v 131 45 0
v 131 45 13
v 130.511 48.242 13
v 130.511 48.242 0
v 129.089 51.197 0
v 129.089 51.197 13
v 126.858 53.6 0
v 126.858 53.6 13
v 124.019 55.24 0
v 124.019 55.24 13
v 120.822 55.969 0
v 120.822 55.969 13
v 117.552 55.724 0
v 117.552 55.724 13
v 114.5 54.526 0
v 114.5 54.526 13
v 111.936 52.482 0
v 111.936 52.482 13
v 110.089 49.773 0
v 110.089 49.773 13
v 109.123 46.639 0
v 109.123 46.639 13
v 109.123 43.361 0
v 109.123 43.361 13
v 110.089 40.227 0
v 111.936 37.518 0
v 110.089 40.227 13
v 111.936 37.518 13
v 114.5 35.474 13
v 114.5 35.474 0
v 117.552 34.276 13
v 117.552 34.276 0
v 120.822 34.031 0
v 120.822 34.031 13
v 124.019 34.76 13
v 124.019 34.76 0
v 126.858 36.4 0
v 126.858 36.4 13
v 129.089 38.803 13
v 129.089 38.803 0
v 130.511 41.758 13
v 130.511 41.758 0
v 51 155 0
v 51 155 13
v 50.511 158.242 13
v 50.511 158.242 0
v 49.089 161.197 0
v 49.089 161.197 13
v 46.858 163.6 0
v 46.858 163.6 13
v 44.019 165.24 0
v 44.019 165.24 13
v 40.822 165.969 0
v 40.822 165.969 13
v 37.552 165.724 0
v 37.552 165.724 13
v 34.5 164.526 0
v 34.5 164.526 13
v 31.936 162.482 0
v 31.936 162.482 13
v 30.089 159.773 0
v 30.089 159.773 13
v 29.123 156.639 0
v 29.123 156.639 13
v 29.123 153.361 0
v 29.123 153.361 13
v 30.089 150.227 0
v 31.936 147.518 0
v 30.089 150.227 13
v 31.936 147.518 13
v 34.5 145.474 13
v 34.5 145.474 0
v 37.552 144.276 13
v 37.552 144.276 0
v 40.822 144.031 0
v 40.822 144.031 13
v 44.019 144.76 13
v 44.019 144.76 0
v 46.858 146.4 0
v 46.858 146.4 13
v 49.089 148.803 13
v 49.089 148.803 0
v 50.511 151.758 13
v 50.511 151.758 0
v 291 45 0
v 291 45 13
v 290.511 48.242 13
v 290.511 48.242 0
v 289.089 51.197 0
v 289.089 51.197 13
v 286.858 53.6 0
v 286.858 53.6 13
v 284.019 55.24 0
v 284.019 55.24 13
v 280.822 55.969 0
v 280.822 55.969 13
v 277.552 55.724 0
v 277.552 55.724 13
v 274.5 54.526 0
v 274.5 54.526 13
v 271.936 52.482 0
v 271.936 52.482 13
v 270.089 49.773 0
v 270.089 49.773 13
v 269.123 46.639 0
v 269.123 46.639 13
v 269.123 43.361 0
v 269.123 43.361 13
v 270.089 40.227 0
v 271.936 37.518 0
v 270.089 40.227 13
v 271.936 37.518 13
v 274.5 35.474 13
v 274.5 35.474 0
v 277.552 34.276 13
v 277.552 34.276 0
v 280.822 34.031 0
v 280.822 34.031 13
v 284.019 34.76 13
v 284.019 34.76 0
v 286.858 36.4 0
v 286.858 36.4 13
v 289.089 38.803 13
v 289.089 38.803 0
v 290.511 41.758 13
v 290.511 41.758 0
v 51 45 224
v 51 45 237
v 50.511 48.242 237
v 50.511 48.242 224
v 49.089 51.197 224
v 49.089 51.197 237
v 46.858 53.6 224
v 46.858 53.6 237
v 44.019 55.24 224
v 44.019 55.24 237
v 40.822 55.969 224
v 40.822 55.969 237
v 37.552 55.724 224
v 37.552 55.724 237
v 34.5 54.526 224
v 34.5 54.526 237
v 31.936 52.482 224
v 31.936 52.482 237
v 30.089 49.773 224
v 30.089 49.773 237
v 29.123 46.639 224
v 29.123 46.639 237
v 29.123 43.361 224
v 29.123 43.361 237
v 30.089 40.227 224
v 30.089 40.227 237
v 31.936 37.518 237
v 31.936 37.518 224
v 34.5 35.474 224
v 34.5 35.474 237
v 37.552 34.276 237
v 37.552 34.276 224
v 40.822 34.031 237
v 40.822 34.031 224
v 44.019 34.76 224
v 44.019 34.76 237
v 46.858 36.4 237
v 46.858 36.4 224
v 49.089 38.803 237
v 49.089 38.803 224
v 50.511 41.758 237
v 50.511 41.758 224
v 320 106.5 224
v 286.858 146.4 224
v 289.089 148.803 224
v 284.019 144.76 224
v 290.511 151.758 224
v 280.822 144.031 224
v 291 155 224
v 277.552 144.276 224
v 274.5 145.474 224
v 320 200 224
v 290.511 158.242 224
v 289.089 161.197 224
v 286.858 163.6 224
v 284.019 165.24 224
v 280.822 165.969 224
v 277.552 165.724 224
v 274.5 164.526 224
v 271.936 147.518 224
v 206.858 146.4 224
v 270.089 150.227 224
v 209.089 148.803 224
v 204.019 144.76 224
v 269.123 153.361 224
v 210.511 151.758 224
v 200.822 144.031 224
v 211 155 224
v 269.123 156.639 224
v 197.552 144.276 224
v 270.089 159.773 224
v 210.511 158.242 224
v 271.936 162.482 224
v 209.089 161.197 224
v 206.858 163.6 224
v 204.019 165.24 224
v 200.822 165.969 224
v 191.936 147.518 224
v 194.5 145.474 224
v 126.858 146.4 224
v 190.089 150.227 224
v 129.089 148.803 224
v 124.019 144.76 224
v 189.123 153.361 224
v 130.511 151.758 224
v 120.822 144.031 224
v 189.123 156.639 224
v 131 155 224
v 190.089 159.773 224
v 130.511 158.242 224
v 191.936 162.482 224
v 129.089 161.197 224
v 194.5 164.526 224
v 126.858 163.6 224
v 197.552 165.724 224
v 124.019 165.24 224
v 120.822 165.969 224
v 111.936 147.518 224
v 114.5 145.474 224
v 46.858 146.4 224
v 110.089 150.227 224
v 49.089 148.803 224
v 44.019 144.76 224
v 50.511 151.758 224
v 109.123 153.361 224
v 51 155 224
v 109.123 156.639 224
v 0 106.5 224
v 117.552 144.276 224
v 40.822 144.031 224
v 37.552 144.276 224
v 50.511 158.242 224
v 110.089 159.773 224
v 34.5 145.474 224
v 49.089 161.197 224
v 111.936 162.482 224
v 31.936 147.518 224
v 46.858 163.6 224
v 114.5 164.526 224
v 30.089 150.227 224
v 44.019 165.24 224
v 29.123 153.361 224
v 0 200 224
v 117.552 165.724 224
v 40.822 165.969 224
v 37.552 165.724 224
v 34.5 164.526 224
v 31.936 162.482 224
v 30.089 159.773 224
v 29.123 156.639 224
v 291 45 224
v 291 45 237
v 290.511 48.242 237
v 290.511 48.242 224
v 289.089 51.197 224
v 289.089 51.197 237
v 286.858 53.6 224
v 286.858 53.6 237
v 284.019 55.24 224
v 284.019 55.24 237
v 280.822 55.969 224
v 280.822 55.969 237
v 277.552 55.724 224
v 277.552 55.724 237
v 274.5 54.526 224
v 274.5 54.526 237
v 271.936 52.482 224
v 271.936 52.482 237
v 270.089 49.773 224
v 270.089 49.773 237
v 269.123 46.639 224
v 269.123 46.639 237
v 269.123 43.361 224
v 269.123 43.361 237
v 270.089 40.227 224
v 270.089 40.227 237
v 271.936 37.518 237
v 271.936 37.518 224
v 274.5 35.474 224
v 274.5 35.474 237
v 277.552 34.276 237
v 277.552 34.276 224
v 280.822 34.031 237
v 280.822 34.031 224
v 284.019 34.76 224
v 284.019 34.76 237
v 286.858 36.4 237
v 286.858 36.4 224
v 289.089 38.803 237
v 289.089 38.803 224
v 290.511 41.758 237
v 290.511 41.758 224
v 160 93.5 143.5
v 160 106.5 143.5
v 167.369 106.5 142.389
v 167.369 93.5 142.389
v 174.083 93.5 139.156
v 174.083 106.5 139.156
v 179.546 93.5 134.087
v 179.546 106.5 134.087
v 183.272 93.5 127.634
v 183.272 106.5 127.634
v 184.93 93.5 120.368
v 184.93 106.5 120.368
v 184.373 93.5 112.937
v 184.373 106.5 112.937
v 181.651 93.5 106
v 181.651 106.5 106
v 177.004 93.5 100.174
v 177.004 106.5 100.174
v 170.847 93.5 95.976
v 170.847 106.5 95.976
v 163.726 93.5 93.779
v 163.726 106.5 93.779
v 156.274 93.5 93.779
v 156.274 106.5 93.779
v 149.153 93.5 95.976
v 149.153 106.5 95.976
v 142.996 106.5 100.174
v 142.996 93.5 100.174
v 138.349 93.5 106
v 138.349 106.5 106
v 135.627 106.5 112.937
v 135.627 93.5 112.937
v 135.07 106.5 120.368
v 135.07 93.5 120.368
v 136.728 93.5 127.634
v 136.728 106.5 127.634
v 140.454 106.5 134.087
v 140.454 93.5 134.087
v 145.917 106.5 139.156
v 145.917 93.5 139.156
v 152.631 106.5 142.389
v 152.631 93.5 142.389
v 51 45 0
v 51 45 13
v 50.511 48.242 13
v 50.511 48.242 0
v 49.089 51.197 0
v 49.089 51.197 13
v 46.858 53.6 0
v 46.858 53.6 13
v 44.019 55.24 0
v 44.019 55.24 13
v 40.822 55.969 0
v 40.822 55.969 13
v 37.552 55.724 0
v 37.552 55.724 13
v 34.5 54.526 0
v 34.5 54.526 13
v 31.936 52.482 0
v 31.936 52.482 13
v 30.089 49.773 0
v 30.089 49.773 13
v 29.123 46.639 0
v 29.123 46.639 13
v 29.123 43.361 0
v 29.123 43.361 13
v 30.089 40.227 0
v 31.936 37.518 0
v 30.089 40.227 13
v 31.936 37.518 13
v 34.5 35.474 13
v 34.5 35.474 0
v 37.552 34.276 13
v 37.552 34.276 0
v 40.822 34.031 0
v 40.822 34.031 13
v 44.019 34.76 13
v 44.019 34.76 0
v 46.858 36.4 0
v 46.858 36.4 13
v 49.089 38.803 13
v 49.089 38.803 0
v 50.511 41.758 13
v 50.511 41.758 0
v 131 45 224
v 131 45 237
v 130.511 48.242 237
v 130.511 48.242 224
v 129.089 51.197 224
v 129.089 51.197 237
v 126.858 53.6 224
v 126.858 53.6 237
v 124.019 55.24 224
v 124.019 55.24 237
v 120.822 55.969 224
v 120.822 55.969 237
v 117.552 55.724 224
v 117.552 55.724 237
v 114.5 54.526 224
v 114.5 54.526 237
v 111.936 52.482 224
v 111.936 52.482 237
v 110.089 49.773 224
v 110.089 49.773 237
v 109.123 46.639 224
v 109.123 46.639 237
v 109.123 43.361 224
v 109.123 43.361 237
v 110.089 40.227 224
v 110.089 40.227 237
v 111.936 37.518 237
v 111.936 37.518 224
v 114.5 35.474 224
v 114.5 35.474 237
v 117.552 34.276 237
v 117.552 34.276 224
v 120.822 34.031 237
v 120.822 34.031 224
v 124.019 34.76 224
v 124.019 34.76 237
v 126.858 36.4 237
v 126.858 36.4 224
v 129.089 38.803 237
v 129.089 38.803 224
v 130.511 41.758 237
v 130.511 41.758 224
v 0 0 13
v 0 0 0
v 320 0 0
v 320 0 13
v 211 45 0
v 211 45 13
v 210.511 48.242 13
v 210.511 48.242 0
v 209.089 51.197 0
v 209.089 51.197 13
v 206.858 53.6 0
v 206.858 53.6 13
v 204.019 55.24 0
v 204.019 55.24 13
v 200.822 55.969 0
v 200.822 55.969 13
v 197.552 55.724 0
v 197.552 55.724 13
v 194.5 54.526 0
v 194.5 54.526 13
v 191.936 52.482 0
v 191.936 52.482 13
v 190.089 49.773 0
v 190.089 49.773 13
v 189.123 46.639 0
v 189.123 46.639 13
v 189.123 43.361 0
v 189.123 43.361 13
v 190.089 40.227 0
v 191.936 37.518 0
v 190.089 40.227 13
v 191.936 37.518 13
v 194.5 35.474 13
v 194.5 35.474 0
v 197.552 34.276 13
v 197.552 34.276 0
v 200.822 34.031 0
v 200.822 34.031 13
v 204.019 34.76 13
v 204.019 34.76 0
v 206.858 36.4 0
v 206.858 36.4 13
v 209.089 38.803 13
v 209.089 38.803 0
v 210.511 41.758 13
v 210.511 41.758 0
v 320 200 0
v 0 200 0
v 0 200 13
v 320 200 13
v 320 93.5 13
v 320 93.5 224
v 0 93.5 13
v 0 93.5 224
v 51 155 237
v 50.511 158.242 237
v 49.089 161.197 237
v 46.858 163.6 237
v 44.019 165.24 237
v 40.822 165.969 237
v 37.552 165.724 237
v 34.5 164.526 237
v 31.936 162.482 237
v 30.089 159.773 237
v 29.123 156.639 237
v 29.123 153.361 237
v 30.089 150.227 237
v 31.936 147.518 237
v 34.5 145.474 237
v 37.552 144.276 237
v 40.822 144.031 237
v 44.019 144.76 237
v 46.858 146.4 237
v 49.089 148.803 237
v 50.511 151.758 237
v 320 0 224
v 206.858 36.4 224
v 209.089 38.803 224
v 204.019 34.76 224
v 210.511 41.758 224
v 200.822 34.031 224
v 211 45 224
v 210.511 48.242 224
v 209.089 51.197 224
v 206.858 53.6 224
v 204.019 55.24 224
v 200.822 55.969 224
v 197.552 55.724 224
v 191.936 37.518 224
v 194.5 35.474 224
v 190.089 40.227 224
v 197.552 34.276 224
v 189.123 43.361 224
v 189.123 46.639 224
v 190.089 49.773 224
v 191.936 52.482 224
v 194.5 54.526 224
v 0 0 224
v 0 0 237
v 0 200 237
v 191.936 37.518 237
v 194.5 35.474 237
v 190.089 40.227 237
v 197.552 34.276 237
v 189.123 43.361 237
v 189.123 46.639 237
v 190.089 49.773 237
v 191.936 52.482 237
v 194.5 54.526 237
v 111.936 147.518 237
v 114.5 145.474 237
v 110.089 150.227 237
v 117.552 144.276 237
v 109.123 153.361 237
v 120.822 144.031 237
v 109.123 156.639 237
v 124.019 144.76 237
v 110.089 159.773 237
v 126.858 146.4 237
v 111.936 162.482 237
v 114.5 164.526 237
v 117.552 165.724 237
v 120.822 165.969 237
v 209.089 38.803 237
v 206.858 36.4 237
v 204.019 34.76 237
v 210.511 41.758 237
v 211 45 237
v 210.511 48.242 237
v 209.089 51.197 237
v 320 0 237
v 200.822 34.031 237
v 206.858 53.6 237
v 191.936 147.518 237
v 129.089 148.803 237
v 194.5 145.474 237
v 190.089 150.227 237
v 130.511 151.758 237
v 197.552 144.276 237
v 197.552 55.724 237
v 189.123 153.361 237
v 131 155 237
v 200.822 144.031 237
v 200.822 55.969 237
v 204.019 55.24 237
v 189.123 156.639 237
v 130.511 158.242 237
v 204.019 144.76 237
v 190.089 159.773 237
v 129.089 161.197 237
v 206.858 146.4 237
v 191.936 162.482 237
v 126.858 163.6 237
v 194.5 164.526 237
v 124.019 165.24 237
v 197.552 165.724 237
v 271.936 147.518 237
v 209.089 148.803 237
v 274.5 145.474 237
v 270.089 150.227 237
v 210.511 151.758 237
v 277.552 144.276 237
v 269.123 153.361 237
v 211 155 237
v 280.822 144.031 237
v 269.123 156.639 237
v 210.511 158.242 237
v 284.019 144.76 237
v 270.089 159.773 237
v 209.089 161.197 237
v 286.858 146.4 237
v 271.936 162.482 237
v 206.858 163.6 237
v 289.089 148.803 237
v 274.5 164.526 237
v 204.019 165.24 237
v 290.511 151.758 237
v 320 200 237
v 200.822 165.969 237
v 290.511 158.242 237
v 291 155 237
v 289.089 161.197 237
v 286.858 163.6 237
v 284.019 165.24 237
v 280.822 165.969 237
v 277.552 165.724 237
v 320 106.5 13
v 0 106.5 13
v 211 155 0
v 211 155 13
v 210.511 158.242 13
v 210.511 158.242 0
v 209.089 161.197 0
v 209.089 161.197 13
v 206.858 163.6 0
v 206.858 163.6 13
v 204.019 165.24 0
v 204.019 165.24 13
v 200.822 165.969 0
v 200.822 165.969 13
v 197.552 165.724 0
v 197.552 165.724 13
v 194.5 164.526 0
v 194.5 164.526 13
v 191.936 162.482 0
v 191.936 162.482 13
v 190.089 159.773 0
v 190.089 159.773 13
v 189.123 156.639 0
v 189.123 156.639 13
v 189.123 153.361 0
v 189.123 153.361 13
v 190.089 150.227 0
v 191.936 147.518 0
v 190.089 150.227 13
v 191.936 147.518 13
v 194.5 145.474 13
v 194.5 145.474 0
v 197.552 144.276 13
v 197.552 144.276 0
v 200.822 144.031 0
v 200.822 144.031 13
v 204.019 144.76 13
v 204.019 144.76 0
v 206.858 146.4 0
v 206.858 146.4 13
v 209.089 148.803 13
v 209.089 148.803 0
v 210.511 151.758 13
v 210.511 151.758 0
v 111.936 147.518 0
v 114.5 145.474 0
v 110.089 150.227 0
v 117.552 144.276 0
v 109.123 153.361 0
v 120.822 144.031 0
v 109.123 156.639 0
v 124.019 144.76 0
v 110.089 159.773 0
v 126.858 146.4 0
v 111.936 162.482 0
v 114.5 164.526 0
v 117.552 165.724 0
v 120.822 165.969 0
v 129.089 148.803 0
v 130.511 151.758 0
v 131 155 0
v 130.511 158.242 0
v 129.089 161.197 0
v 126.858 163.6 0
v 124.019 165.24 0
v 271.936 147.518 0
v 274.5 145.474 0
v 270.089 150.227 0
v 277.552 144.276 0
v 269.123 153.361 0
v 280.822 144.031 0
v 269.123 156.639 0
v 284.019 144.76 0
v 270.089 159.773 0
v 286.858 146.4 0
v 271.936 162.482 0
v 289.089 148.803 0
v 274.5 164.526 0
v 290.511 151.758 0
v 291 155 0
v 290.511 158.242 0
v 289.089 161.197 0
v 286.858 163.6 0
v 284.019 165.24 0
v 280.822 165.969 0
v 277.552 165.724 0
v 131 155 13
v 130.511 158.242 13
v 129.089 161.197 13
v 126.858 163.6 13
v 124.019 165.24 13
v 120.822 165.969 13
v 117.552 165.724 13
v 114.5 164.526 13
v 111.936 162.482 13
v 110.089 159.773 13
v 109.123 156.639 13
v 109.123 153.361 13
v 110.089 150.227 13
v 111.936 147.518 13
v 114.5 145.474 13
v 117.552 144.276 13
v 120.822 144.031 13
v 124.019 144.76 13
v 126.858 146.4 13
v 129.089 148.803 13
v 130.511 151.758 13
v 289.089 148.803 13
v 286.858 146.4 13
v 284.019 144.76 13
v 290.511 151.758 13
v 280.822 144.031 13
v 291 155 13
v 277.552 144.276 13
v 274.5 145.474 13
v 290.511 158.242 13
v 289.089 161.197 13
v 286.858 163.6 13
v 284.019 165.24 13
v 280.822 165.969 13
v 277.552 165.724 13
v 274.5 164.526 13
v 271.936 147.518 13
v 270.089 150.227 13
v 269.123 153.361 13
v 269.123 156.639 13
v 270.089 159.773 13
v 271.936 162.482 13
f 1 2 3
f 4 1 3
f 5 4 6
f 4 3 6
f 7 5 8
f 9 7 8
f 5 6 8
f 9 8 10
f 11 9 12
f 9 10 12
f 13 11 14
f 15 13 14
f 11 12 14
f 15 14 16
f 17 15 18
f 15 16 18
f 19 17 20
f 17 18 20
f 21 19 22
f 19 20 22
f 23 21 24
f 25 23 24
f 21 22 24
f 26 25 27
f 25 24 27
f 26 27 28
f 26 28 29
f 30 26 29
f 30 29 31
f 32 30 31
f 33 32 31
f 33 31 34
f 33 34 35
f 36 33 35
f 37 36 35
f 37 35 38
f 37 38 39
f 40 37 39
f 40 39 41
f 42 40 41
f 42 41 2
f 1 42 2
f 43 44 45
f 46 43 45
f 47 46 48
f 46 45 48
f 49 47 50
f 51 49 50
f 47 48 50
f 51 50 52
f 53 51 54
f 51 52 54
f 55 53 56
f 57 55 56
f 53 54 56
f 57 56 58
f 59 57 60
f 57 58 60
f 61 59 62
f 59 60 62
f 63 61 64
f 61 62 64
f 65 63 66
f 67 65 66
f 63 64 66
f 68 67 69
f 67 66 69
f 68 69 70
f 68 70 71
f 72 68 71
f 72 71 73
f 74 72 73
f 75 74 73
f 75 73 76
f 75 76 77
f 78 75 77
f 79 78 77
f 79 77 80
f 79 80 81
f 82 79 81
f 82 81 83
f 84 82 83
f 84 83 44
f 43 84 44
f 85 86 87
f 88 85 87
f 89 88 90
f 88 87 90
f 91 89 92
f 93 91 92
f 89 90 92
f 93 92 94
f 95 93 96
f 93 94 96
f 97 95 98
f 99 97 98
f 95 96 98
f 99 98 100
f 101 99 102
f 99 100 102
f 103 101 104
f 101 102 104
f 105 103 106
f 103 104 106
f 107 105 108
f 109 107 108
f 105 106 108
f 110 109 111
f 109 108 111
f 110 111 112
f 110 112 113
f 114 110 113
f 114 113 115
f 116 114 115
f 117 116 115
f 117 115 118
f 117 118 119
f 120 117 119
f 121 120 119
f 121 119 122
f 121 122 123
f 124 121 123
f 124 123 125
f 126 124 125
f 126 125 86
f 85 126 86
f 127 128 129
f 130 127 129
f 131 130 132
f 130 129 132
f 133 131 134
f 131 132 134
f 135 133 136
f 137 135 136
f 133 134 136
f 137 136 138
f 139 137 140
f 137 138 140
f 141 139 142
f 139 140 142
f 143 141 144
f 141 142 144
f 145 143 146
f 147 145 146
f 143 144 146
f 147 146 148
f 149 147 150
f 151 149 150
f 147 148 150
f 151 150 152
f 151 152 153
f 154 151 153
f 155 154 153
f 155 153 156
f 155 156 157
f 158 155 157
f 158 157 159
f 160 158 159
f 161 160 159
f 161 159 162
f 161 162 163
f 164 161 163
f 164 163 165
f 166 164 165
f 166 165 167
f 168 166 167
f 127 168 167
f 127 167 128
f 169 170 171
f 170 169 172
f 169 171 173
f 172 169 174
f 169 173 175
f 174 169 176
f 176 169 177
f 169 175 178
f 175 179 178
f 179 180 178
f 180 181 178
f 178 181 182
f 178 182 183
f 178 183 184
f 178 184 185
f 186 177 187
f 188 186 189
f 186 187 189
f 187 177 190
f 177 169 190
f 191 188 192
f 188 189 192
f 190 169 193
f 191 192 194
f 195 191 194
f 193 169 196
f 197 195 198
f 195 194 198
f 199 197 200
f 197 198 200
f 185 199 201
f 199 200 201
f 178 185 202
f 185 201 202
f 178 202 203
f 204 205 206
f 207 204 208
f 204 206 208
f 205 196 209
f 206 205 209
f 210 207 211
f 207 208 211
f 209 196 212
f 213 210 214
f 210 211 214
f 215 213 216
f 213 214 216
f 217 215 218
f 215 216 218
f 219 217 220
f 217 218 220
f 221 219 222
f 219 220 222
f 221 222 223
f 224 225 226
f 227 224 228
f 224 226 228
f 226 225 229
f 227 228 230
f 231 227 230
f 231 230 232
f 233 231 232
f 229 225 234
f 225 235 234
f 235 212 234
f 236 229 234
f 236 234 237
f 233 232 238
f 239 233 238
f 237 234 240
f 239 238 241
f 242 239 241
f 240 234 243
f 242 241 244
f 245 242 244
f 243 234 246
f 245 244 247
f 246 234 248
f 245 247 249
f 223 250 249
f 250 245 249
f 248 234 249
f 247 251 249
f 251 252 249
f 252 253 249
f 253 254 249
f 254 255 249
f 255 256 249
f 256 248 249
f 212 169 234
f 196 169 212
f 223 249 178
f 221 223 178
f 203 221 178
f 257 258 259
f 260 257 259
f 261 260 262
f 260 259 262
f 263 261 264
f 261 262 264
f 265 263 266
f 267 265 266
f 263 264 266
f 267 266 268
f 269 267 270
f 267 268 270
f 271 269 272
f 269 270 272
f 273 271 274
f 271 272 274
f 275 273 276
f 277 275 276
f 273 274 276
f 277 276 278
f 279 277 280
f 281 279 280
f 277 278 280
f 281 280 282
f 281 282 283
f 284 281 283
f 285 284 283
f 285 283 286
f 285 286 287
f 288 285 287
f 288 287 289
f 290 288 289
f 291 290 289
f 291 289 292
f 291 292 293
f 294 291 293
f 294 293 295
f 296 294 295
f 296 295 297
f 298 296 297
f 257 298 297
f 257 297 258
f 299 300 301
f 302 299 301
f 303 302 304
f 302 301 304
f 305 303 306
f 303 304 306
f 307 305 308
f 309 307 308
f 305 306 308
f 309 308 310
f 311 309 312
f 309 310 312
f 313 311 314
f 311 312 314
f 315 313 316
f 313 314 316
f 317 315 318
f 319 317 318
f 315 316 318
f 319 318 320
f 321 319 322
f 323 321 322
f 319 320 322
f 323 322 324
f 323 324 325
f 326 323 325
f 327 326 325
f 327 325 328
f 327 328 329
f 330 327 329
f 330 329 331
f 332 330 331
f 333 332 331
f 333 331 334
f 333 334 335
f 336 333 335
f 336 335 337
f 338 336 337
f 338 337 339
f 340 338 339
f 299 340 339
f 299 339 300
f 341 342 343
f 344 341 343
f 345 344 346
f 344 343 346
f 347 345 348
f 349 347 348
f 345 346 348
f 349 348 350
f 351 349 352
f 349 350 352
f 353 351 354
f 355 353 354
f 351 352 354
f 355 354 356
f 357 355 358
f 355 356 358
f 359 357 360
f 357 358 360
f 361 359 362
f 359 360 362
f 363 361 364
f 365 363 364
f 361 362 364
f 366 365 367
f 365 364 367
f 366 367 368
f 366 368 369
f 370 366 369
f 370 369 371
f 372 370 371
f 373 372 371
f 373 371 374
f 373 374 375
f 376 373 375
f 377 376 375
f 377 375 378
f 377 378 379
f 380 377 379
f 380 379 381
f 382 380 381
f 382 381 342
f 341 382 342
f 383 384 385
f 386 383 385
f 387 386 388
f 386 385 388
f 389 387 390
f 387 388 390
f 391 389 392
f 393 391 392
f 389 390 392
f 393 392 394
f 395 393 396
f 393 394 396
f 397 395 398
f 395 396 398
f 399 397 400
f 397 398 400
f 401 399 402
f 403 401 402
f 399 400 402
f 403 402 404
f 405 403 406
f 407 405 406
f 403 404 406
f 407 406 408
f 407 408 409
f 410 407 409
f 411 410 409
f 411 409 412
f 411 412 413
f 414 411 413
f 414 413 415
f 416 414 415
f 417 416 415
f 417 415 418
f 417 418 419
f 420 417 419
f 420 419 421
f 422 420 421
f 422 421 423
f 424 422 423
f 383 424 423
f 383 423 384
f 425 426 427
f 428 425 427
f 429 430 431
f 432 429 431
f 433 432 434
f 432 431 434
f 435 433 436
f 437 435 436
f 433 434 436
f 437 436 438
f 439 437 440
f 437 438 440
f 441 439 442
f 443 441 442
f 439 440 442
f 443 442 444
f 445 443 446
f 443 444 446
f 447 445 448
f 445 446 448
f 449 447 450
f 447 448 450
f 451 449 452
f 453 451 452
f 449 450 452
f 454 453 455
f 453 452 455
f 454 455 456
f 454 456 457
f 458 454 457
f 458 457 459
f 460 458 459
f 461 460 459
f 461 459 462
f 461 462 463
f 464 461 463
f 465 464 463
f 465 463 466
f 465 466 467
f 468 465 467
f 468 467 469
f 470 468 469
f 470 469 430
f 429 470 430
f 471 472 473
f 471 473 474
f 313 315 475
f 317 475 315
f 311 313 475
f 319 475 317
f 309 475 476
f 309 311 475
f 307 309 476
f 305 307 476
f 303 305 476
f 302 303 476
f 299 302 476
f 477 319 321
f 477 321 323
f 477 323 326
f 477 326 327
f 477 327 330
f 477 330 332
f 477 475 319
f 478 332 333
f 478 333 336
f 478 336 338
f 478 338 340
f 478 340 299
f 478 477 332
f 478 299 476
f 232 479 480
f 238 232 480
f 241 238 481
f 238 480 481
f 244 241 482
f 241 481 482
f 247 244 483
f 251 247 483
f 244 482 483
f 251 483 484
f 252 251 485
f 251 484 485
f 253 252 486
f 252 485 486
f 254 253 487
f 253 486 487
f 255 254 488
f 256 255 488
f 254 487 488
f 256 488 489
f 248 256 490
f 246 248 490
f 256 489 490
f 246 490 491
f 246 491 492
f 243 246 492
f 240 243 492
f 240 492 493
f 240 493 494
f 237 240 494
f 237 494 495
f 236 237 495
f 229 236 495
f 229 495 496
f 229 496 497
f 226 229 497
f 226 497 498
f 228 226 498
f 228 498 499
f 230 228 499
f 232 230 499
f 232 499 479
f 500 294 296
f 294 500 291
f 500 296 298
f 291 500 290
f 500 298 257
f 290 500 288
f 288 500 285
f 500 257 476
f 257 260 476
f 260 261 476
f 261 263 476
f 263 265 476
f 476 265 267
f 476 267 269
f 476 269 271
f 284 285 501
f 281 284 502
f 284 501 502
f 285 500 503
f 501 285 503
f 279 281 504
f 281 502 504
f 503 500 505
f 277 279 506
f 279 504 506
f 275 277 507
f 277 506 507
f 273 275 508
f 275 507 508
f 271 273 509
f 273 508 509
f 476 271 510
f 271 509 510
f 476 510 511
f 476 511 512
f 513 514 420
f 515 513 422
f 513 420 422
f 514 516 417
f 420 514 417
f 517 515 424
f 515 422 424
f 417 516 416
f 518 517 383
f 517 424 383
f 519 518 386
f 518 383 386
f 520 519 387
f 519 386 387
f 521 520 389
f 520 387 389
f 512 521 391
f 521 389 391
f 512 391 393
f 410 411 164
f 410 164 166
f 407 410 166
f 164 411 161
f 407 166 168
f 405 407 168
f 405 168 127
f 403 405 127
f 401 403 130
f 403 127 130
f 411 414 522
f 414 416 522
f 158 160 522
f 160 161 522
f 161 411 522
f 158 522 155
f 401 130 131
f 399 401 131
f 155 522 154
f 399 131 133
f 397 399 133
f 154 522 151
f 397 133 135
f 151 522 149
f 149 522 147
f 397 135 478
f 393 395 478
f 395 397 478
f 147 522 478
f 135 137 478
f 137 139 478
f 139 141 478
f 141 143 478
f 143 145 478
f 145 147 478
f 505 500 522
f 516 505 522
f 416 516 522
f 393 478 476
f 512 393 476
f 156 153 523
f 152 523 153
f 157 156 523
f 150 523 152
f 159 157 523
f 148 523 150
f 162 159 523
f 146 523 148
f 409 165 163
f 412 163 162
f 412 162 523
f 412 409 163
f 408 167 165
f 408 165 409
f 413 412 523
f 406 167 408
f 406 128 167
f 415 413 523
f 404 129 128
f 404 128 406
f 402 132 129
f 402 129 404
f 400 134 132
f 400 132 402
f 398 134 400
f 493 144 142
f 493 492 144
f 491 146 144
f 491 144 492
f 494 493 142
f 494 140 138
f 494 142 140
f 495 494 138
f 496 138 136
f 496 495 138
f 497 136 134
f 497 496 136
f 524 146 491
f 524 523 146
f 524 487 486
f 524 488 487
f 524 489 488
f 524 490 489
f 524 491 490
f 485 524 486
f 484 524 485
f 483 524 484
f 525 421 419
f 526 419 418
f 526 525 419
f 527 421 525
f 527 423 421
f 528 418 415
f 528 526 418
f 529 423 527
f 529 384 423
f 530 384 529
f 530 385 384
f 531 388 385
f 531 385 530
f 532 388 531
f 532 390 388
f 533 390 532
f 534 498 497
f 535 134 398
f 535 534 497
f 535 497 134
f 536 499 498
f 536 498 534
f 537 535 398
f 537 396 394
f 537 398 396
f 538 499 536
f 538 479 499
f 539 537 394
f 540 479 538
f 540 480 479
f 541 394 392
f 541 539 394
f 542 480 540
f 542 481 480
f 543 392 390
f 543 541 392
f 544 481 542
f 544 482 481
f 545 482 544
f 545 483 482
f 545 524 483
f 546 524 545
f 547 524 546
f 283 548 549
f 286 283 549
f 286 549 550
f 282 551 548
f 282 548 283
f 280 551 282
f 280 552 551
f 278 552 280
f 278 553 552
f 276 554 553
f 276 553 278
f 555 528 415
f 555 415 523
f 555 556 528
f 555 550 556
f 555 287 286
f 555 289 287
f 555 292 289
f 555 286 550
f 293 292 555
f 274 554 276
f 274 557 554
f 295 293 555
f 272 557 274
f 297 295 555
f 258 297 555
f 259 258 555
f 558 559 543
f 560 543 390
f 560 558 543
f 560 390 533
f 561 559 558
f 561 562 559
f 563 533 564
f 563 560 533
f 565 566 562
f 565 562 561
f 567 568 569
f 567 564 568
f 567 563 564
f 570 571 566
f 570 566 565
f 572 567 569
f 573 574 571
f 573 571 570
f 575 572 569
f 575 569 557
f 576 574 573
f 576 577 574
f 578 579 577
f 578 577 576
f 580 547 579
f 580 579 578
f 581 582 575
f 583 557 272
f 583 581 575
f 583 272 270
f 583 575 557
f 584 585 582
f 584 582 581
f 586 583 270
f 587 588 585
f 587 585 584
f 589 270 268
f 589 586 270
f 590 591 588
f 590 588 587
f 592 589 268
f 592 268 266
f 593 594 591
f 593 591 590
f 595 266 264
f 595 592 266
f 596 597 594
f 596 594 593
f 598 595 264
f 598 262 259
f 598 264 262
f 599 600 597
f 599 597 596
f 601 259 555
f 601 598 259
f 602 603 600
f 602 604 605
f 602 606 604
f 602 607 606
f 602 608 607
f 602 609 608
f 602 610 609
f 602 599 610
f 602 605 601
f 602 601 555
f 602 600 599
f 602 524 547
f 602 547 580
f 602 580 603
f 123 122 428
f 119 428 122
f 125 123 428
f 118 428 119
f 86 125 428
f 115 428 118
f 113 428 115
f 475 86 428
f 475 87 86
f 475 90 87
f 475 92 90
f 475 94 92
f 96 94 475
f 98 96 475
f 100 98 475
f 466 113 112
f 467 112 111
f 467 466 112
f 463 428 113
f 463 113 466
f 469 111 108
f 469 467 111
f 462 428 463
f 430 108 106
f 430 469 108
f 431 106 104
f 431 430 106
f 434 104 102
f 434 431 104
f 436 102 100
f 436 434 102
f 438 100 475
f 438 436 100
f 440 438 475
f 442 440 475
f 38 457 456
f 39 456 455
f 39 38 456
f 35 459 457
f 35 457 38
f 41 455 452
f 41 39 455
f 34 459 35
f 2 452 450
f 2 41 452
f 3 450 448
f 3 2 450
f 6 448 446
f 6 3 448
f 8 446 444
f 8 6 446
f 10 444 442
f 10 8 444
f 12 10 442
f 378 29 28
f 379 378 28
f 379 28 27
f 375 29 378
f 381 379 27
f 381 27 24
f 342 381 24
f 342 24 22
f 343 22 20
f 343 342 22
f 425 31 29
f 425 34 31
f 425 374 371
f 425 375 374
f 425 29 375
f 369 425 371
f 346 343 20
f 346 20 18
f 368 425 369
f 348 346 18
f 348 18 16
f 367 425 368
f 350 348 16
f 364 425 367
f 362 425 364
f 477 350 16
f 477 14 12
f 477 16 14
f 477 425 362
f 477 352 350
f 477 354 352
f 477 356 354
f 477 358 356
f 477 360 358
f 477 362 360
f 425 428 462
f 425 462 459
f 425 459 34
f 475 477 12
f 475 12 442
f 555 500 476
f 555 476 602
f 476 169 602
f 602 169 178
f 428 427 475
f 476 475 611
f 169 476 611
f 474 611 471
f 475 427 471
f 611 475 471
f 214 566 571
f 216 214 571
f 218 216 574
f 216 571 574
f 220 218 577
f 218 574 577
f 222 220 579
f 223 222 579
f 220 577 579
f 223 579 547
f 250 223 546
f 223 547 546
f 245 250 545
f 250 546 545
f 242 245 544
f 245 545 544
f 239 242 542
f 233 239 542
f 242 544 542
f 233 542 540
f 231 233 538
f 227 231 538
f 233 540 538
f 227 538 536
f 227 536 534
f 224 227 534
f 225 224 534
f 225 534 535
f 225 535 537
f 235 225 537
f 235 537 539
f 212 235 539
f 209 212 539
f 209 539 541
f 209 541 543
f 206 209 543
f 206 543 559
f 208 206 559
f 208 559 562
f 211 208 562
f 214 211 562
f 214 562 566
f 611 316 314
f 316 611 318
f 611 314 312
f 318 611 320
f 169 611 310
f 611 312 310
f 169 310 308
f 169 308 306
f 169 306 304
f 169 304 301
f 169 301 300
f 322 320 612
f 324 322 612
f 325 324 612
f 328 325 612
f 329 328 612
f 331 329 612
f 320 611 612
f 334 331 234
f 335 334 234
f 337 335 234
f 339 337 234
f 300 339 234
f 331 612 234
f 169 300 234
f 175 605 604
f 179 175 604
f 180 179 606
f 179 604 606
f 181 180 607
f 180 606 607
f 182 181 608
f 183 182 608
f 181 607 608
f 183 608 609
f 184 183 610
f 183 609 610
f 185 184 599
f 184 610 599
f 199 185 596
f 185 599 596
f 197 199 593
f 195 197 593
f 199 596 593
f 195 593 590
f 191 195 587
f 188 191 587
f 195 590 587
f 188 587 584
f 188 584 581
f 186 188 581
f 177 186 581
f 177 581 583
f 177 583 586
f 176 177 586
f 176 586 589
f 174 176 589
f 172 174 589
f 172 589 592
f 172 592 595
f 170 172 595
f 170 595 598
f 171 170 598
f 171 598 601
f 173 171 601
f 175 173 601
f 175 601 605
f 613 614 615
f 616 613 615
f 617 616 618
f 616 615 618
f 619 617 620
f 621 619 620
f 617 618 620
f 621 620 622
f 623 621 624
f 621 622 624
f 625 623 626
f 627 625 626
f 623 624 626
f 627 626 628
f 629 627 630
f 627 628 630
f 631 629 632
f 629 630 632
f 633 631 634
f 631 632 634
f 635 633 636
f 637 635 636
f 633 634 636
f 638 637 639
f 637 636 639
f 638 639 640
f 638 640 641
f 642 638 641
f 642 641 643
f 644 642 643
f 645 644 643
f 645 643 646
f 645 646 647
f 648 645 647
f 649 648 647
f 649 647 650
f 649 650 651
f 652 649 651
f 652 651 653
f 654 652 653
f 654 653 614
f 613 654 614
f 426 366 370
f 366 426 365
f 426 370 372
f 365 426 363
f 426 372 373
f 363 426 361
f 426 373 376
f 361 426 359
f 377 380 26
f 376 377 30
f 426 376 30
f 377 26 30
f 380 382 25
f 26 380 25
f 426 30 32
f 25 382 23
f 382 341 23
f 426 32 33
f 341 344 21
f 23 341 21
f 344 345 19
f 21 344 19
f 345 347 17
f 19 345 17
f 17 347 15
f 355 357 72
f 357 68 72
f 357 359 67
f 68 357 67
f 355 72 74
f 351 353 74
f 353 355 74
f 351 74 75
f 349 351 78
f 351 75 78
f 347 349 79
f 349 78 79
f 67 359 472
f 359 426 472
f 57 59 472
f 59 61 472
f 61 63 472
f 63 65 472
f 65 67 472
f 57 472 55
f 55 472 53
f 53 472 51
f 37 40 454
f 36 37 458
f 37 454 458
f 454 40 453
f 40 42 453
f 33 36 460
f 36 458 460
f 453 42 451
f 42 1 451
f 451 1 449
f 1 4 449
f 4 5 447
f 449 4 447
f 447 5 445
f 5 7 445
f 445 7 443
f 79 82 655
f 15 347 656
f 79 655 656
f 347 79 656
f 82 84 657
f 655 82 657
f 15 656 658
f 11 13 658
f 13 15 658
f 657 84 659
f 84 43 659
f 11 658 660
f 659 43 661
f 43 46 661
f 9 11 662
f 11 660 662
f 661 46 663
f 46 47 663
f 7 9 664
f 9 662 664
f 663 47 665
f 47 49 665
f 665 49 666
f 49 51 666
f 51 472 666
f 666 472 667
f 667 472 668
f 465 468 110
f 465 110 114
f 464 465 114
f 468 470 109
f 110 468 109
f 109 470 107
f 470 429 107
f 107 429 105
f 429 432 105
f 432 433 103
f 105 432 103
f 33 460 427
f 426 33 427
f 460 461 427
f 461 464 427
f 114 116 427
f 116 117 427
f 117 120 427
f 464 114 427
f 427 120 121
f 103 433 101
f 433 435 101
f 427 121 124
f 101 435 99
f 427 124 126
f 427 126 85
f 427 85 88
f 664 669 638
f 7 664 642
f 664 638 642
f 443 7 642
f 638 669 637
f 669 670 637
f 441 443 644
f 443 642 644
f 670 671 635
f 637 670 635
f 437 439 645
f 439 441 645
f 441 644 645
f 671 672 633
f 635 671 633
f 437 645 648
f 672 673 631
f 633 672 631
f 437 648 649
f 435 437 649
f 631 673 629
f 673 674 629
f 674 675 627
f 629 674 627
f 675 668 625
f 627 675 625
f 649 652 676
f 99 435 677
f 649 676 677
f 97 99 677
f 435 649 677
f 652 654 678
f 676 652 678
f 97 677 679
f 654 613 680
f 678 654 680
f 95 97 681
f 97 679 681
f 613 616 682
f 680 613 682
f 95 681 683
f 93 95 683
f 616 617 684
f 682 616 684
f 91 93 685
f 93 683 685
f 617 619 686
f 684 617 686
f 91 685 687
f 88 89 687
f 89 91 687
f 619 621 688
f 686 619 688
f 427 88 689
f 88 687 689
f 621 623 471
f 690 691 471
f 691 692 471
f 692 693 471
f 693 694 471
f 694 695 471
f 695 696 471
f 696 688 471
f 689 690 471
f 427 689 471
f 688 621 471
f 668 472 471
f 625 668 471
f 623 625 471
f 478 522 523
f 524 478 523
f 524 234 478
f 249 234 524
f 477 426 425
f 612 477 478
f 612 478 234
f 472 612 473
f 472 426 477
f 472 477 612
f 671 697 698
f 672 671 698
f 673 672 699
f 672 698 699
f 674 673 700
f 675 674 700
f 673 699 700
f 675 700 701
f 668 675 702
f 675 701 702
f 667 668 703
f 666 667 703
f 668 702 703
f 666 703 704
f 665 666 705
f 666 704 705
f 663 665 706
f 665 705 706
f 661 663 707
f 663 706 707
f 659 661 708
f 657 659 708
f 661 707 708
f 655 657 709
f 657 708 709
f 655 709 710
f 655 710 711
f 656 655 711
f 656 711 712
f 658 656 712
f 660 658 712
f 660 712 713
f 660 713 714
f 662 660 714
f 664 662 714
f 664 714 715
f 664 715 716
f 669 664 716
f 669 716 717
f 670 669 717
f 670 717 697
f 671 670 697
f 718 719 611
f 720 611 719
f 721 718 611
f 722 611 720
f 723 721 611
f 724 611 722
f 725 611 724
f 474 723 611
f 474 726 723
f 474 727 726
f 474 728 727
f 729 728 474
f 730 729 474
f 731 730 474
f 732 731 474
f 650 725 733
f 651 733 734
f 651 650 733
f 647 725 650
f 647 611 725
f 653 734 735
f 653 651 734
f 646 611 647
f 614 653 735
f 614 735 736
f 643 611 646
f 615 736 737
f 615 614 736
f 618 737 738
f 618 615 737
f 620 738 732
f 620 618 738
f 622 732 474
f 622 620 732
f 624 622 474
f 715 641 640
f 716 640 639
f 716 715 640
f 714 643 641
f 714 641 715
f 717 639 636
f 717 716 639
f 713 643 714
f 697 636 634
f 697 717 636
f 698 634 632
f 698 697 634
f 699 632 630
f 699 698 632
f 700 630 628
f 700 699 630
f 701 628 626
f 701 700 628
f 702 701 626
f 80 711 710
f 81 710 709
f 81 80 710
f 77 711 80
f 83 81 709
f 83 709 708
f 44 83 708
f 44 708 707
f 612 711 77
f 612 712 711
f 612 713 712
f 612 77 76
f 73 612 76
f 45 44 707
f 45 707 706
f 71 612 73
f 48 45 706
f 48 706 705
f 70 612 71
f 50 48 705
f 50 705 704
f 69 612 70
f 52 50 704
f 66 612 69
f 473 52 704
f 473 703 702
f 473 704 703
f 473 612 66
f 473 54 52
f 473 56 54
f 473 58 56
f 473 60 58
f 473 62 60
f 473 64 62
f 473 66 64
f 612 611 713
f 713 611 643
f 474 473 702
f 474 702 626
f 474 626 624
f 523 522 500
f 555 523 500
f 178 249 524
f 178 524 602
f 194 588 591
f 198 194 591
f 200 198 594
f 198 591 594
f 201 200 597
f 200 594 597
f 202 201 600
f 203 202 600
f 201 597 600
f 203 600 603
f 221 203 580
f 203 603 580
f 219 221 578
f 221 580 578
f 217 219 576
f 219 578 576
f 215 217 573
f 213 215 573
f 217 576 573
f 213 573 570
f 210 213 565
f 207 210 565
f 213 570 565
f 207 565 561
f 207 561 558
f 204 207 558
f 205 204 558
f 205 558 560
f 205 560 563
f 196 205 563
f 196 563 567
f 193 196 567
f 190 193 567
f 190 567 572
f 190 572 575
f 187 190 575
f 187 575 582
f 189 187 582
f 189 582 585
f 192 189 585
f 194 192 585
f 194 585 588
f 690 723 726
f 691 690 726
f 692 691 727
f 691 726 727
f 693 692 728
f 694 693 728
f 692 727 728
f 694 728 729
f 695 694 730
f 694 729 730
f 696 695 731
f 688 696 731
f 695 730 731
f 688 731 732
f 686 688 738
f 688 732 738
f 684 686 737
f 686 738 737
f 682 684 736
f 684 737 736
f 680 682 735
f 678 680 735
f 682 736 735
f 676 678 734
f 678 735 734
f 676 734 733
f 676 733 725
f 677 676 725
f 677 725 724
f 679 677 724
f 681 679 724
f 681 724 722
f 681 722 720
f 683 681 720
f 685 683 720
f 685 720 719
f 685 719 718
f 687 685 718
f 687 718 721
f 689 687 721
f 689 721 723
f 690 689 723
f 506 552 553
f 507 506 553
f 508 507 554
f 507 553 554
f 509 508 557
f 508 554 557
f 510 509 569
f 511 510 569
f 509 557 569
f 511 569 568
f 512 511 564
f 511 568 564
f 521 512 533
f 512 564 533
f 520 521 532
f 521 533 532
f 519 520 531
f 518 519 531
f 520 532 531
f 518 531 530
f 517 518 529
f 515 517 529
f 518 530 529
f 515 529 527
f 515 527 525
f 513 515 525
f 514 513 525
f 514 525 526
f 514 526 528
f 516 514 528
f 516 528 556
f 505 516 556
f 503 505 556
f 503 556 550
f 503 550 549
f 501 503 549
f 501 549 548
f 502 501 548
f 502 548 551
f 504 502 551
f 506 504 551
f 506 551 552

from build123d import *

# Parameters (mm, degrees)
SKETCH_1_W                  = 320
SKETCH_1_H                  = 200
EXTRUDE_1_DEPTH             = 237
SKETCH_2_R                  = 11
CUT_EXTRUDE_1_DEPTH         = 446.610816745
PATTERN_LINEAR_1_COUNT      = 4
PATTERN_LINEAR_1_PITCH      = 80
PATTERN_LINEAR_1_COUNT_DIR2 = 2
PATTERN_LINEAR_1_PITCH_DIR2 = 110
SKETCH_6_W                  = 211
SKETCH_6_H                  = 93.5
CUT_EXTRUDE_3_DEPTH         = 446.610816745
SKETCH_7_R                  = 25
CUT_EXTRUDE_4_DEPTH         = 413.202923328


with BuildPart() as part:
    # 草图1 → 拉伸1 (new body)
    with BuildSketch(Plane.XY):
        with Locations((160, 100)):
            Rectangle(SKETCH_1_W, SKETCH_1_H)
    extrude(amount=EXTRUDE_1_DEPTH)

    # 草图2 → 切除-拉伸1 (cut, through all)
    with BuildSketch(Plane.XY.offset(237)):
        with Locations((40, 45)):
            Circle(SKETCH_2_R)
    cut_extrude_1 = extrude(amount=-CUT_EXTRUDE_1_DEPTH, mode=Mode.SUBTRACT)

    # 阵列(线性)1: Cut-Extrude 1 4 × 2
    with Locations(*[(i * PATTERN_LINEAR_1_PITCH, j * PATTERN_LINEAR_1_PITCH_DIR2, 0) for i in range(PATTERN_LINEAR_1_COUNT) for j in range(PATTERN_LINEAR_1_COUNT_DIR2) if (i, j) != (0, 0)]):
        add(cut_extrude_1, mode=Mode.SUBTRACT)

    # 草图6 → 切除-拉伸3 (cut, through all)
    with BuildSketch(Plane.ZY):
        with Locations((118.5, 153.25)):
            Rectangle(SKETCH_6_W, SKETCH_6_H)
        with Locations((118.5, 46.75)):
            Rectangle(SKETCH_6_W, SKETCH_6_H)
    extrude(amount=-CUT_EXTRUDE_3_DEPTH, mode=Mode.SUBTRACT)

    # 草图7 → 切除-拉伸4 (cut, through all)
    with BuildSketch(Plane(origin=(0, 106.5, 0), x_dir=(1, 0, 0), z_dir=(0, 1, 0))):
        with Locations(Location((160, -118.5, 0), (0, 0, 270))):
            Circle(SKETCH_7_R)
    extrude(amount=-CUT_EXTRUDE_4_DEPTH, mode=Mode.SUBTRACT)


solid = part.part
